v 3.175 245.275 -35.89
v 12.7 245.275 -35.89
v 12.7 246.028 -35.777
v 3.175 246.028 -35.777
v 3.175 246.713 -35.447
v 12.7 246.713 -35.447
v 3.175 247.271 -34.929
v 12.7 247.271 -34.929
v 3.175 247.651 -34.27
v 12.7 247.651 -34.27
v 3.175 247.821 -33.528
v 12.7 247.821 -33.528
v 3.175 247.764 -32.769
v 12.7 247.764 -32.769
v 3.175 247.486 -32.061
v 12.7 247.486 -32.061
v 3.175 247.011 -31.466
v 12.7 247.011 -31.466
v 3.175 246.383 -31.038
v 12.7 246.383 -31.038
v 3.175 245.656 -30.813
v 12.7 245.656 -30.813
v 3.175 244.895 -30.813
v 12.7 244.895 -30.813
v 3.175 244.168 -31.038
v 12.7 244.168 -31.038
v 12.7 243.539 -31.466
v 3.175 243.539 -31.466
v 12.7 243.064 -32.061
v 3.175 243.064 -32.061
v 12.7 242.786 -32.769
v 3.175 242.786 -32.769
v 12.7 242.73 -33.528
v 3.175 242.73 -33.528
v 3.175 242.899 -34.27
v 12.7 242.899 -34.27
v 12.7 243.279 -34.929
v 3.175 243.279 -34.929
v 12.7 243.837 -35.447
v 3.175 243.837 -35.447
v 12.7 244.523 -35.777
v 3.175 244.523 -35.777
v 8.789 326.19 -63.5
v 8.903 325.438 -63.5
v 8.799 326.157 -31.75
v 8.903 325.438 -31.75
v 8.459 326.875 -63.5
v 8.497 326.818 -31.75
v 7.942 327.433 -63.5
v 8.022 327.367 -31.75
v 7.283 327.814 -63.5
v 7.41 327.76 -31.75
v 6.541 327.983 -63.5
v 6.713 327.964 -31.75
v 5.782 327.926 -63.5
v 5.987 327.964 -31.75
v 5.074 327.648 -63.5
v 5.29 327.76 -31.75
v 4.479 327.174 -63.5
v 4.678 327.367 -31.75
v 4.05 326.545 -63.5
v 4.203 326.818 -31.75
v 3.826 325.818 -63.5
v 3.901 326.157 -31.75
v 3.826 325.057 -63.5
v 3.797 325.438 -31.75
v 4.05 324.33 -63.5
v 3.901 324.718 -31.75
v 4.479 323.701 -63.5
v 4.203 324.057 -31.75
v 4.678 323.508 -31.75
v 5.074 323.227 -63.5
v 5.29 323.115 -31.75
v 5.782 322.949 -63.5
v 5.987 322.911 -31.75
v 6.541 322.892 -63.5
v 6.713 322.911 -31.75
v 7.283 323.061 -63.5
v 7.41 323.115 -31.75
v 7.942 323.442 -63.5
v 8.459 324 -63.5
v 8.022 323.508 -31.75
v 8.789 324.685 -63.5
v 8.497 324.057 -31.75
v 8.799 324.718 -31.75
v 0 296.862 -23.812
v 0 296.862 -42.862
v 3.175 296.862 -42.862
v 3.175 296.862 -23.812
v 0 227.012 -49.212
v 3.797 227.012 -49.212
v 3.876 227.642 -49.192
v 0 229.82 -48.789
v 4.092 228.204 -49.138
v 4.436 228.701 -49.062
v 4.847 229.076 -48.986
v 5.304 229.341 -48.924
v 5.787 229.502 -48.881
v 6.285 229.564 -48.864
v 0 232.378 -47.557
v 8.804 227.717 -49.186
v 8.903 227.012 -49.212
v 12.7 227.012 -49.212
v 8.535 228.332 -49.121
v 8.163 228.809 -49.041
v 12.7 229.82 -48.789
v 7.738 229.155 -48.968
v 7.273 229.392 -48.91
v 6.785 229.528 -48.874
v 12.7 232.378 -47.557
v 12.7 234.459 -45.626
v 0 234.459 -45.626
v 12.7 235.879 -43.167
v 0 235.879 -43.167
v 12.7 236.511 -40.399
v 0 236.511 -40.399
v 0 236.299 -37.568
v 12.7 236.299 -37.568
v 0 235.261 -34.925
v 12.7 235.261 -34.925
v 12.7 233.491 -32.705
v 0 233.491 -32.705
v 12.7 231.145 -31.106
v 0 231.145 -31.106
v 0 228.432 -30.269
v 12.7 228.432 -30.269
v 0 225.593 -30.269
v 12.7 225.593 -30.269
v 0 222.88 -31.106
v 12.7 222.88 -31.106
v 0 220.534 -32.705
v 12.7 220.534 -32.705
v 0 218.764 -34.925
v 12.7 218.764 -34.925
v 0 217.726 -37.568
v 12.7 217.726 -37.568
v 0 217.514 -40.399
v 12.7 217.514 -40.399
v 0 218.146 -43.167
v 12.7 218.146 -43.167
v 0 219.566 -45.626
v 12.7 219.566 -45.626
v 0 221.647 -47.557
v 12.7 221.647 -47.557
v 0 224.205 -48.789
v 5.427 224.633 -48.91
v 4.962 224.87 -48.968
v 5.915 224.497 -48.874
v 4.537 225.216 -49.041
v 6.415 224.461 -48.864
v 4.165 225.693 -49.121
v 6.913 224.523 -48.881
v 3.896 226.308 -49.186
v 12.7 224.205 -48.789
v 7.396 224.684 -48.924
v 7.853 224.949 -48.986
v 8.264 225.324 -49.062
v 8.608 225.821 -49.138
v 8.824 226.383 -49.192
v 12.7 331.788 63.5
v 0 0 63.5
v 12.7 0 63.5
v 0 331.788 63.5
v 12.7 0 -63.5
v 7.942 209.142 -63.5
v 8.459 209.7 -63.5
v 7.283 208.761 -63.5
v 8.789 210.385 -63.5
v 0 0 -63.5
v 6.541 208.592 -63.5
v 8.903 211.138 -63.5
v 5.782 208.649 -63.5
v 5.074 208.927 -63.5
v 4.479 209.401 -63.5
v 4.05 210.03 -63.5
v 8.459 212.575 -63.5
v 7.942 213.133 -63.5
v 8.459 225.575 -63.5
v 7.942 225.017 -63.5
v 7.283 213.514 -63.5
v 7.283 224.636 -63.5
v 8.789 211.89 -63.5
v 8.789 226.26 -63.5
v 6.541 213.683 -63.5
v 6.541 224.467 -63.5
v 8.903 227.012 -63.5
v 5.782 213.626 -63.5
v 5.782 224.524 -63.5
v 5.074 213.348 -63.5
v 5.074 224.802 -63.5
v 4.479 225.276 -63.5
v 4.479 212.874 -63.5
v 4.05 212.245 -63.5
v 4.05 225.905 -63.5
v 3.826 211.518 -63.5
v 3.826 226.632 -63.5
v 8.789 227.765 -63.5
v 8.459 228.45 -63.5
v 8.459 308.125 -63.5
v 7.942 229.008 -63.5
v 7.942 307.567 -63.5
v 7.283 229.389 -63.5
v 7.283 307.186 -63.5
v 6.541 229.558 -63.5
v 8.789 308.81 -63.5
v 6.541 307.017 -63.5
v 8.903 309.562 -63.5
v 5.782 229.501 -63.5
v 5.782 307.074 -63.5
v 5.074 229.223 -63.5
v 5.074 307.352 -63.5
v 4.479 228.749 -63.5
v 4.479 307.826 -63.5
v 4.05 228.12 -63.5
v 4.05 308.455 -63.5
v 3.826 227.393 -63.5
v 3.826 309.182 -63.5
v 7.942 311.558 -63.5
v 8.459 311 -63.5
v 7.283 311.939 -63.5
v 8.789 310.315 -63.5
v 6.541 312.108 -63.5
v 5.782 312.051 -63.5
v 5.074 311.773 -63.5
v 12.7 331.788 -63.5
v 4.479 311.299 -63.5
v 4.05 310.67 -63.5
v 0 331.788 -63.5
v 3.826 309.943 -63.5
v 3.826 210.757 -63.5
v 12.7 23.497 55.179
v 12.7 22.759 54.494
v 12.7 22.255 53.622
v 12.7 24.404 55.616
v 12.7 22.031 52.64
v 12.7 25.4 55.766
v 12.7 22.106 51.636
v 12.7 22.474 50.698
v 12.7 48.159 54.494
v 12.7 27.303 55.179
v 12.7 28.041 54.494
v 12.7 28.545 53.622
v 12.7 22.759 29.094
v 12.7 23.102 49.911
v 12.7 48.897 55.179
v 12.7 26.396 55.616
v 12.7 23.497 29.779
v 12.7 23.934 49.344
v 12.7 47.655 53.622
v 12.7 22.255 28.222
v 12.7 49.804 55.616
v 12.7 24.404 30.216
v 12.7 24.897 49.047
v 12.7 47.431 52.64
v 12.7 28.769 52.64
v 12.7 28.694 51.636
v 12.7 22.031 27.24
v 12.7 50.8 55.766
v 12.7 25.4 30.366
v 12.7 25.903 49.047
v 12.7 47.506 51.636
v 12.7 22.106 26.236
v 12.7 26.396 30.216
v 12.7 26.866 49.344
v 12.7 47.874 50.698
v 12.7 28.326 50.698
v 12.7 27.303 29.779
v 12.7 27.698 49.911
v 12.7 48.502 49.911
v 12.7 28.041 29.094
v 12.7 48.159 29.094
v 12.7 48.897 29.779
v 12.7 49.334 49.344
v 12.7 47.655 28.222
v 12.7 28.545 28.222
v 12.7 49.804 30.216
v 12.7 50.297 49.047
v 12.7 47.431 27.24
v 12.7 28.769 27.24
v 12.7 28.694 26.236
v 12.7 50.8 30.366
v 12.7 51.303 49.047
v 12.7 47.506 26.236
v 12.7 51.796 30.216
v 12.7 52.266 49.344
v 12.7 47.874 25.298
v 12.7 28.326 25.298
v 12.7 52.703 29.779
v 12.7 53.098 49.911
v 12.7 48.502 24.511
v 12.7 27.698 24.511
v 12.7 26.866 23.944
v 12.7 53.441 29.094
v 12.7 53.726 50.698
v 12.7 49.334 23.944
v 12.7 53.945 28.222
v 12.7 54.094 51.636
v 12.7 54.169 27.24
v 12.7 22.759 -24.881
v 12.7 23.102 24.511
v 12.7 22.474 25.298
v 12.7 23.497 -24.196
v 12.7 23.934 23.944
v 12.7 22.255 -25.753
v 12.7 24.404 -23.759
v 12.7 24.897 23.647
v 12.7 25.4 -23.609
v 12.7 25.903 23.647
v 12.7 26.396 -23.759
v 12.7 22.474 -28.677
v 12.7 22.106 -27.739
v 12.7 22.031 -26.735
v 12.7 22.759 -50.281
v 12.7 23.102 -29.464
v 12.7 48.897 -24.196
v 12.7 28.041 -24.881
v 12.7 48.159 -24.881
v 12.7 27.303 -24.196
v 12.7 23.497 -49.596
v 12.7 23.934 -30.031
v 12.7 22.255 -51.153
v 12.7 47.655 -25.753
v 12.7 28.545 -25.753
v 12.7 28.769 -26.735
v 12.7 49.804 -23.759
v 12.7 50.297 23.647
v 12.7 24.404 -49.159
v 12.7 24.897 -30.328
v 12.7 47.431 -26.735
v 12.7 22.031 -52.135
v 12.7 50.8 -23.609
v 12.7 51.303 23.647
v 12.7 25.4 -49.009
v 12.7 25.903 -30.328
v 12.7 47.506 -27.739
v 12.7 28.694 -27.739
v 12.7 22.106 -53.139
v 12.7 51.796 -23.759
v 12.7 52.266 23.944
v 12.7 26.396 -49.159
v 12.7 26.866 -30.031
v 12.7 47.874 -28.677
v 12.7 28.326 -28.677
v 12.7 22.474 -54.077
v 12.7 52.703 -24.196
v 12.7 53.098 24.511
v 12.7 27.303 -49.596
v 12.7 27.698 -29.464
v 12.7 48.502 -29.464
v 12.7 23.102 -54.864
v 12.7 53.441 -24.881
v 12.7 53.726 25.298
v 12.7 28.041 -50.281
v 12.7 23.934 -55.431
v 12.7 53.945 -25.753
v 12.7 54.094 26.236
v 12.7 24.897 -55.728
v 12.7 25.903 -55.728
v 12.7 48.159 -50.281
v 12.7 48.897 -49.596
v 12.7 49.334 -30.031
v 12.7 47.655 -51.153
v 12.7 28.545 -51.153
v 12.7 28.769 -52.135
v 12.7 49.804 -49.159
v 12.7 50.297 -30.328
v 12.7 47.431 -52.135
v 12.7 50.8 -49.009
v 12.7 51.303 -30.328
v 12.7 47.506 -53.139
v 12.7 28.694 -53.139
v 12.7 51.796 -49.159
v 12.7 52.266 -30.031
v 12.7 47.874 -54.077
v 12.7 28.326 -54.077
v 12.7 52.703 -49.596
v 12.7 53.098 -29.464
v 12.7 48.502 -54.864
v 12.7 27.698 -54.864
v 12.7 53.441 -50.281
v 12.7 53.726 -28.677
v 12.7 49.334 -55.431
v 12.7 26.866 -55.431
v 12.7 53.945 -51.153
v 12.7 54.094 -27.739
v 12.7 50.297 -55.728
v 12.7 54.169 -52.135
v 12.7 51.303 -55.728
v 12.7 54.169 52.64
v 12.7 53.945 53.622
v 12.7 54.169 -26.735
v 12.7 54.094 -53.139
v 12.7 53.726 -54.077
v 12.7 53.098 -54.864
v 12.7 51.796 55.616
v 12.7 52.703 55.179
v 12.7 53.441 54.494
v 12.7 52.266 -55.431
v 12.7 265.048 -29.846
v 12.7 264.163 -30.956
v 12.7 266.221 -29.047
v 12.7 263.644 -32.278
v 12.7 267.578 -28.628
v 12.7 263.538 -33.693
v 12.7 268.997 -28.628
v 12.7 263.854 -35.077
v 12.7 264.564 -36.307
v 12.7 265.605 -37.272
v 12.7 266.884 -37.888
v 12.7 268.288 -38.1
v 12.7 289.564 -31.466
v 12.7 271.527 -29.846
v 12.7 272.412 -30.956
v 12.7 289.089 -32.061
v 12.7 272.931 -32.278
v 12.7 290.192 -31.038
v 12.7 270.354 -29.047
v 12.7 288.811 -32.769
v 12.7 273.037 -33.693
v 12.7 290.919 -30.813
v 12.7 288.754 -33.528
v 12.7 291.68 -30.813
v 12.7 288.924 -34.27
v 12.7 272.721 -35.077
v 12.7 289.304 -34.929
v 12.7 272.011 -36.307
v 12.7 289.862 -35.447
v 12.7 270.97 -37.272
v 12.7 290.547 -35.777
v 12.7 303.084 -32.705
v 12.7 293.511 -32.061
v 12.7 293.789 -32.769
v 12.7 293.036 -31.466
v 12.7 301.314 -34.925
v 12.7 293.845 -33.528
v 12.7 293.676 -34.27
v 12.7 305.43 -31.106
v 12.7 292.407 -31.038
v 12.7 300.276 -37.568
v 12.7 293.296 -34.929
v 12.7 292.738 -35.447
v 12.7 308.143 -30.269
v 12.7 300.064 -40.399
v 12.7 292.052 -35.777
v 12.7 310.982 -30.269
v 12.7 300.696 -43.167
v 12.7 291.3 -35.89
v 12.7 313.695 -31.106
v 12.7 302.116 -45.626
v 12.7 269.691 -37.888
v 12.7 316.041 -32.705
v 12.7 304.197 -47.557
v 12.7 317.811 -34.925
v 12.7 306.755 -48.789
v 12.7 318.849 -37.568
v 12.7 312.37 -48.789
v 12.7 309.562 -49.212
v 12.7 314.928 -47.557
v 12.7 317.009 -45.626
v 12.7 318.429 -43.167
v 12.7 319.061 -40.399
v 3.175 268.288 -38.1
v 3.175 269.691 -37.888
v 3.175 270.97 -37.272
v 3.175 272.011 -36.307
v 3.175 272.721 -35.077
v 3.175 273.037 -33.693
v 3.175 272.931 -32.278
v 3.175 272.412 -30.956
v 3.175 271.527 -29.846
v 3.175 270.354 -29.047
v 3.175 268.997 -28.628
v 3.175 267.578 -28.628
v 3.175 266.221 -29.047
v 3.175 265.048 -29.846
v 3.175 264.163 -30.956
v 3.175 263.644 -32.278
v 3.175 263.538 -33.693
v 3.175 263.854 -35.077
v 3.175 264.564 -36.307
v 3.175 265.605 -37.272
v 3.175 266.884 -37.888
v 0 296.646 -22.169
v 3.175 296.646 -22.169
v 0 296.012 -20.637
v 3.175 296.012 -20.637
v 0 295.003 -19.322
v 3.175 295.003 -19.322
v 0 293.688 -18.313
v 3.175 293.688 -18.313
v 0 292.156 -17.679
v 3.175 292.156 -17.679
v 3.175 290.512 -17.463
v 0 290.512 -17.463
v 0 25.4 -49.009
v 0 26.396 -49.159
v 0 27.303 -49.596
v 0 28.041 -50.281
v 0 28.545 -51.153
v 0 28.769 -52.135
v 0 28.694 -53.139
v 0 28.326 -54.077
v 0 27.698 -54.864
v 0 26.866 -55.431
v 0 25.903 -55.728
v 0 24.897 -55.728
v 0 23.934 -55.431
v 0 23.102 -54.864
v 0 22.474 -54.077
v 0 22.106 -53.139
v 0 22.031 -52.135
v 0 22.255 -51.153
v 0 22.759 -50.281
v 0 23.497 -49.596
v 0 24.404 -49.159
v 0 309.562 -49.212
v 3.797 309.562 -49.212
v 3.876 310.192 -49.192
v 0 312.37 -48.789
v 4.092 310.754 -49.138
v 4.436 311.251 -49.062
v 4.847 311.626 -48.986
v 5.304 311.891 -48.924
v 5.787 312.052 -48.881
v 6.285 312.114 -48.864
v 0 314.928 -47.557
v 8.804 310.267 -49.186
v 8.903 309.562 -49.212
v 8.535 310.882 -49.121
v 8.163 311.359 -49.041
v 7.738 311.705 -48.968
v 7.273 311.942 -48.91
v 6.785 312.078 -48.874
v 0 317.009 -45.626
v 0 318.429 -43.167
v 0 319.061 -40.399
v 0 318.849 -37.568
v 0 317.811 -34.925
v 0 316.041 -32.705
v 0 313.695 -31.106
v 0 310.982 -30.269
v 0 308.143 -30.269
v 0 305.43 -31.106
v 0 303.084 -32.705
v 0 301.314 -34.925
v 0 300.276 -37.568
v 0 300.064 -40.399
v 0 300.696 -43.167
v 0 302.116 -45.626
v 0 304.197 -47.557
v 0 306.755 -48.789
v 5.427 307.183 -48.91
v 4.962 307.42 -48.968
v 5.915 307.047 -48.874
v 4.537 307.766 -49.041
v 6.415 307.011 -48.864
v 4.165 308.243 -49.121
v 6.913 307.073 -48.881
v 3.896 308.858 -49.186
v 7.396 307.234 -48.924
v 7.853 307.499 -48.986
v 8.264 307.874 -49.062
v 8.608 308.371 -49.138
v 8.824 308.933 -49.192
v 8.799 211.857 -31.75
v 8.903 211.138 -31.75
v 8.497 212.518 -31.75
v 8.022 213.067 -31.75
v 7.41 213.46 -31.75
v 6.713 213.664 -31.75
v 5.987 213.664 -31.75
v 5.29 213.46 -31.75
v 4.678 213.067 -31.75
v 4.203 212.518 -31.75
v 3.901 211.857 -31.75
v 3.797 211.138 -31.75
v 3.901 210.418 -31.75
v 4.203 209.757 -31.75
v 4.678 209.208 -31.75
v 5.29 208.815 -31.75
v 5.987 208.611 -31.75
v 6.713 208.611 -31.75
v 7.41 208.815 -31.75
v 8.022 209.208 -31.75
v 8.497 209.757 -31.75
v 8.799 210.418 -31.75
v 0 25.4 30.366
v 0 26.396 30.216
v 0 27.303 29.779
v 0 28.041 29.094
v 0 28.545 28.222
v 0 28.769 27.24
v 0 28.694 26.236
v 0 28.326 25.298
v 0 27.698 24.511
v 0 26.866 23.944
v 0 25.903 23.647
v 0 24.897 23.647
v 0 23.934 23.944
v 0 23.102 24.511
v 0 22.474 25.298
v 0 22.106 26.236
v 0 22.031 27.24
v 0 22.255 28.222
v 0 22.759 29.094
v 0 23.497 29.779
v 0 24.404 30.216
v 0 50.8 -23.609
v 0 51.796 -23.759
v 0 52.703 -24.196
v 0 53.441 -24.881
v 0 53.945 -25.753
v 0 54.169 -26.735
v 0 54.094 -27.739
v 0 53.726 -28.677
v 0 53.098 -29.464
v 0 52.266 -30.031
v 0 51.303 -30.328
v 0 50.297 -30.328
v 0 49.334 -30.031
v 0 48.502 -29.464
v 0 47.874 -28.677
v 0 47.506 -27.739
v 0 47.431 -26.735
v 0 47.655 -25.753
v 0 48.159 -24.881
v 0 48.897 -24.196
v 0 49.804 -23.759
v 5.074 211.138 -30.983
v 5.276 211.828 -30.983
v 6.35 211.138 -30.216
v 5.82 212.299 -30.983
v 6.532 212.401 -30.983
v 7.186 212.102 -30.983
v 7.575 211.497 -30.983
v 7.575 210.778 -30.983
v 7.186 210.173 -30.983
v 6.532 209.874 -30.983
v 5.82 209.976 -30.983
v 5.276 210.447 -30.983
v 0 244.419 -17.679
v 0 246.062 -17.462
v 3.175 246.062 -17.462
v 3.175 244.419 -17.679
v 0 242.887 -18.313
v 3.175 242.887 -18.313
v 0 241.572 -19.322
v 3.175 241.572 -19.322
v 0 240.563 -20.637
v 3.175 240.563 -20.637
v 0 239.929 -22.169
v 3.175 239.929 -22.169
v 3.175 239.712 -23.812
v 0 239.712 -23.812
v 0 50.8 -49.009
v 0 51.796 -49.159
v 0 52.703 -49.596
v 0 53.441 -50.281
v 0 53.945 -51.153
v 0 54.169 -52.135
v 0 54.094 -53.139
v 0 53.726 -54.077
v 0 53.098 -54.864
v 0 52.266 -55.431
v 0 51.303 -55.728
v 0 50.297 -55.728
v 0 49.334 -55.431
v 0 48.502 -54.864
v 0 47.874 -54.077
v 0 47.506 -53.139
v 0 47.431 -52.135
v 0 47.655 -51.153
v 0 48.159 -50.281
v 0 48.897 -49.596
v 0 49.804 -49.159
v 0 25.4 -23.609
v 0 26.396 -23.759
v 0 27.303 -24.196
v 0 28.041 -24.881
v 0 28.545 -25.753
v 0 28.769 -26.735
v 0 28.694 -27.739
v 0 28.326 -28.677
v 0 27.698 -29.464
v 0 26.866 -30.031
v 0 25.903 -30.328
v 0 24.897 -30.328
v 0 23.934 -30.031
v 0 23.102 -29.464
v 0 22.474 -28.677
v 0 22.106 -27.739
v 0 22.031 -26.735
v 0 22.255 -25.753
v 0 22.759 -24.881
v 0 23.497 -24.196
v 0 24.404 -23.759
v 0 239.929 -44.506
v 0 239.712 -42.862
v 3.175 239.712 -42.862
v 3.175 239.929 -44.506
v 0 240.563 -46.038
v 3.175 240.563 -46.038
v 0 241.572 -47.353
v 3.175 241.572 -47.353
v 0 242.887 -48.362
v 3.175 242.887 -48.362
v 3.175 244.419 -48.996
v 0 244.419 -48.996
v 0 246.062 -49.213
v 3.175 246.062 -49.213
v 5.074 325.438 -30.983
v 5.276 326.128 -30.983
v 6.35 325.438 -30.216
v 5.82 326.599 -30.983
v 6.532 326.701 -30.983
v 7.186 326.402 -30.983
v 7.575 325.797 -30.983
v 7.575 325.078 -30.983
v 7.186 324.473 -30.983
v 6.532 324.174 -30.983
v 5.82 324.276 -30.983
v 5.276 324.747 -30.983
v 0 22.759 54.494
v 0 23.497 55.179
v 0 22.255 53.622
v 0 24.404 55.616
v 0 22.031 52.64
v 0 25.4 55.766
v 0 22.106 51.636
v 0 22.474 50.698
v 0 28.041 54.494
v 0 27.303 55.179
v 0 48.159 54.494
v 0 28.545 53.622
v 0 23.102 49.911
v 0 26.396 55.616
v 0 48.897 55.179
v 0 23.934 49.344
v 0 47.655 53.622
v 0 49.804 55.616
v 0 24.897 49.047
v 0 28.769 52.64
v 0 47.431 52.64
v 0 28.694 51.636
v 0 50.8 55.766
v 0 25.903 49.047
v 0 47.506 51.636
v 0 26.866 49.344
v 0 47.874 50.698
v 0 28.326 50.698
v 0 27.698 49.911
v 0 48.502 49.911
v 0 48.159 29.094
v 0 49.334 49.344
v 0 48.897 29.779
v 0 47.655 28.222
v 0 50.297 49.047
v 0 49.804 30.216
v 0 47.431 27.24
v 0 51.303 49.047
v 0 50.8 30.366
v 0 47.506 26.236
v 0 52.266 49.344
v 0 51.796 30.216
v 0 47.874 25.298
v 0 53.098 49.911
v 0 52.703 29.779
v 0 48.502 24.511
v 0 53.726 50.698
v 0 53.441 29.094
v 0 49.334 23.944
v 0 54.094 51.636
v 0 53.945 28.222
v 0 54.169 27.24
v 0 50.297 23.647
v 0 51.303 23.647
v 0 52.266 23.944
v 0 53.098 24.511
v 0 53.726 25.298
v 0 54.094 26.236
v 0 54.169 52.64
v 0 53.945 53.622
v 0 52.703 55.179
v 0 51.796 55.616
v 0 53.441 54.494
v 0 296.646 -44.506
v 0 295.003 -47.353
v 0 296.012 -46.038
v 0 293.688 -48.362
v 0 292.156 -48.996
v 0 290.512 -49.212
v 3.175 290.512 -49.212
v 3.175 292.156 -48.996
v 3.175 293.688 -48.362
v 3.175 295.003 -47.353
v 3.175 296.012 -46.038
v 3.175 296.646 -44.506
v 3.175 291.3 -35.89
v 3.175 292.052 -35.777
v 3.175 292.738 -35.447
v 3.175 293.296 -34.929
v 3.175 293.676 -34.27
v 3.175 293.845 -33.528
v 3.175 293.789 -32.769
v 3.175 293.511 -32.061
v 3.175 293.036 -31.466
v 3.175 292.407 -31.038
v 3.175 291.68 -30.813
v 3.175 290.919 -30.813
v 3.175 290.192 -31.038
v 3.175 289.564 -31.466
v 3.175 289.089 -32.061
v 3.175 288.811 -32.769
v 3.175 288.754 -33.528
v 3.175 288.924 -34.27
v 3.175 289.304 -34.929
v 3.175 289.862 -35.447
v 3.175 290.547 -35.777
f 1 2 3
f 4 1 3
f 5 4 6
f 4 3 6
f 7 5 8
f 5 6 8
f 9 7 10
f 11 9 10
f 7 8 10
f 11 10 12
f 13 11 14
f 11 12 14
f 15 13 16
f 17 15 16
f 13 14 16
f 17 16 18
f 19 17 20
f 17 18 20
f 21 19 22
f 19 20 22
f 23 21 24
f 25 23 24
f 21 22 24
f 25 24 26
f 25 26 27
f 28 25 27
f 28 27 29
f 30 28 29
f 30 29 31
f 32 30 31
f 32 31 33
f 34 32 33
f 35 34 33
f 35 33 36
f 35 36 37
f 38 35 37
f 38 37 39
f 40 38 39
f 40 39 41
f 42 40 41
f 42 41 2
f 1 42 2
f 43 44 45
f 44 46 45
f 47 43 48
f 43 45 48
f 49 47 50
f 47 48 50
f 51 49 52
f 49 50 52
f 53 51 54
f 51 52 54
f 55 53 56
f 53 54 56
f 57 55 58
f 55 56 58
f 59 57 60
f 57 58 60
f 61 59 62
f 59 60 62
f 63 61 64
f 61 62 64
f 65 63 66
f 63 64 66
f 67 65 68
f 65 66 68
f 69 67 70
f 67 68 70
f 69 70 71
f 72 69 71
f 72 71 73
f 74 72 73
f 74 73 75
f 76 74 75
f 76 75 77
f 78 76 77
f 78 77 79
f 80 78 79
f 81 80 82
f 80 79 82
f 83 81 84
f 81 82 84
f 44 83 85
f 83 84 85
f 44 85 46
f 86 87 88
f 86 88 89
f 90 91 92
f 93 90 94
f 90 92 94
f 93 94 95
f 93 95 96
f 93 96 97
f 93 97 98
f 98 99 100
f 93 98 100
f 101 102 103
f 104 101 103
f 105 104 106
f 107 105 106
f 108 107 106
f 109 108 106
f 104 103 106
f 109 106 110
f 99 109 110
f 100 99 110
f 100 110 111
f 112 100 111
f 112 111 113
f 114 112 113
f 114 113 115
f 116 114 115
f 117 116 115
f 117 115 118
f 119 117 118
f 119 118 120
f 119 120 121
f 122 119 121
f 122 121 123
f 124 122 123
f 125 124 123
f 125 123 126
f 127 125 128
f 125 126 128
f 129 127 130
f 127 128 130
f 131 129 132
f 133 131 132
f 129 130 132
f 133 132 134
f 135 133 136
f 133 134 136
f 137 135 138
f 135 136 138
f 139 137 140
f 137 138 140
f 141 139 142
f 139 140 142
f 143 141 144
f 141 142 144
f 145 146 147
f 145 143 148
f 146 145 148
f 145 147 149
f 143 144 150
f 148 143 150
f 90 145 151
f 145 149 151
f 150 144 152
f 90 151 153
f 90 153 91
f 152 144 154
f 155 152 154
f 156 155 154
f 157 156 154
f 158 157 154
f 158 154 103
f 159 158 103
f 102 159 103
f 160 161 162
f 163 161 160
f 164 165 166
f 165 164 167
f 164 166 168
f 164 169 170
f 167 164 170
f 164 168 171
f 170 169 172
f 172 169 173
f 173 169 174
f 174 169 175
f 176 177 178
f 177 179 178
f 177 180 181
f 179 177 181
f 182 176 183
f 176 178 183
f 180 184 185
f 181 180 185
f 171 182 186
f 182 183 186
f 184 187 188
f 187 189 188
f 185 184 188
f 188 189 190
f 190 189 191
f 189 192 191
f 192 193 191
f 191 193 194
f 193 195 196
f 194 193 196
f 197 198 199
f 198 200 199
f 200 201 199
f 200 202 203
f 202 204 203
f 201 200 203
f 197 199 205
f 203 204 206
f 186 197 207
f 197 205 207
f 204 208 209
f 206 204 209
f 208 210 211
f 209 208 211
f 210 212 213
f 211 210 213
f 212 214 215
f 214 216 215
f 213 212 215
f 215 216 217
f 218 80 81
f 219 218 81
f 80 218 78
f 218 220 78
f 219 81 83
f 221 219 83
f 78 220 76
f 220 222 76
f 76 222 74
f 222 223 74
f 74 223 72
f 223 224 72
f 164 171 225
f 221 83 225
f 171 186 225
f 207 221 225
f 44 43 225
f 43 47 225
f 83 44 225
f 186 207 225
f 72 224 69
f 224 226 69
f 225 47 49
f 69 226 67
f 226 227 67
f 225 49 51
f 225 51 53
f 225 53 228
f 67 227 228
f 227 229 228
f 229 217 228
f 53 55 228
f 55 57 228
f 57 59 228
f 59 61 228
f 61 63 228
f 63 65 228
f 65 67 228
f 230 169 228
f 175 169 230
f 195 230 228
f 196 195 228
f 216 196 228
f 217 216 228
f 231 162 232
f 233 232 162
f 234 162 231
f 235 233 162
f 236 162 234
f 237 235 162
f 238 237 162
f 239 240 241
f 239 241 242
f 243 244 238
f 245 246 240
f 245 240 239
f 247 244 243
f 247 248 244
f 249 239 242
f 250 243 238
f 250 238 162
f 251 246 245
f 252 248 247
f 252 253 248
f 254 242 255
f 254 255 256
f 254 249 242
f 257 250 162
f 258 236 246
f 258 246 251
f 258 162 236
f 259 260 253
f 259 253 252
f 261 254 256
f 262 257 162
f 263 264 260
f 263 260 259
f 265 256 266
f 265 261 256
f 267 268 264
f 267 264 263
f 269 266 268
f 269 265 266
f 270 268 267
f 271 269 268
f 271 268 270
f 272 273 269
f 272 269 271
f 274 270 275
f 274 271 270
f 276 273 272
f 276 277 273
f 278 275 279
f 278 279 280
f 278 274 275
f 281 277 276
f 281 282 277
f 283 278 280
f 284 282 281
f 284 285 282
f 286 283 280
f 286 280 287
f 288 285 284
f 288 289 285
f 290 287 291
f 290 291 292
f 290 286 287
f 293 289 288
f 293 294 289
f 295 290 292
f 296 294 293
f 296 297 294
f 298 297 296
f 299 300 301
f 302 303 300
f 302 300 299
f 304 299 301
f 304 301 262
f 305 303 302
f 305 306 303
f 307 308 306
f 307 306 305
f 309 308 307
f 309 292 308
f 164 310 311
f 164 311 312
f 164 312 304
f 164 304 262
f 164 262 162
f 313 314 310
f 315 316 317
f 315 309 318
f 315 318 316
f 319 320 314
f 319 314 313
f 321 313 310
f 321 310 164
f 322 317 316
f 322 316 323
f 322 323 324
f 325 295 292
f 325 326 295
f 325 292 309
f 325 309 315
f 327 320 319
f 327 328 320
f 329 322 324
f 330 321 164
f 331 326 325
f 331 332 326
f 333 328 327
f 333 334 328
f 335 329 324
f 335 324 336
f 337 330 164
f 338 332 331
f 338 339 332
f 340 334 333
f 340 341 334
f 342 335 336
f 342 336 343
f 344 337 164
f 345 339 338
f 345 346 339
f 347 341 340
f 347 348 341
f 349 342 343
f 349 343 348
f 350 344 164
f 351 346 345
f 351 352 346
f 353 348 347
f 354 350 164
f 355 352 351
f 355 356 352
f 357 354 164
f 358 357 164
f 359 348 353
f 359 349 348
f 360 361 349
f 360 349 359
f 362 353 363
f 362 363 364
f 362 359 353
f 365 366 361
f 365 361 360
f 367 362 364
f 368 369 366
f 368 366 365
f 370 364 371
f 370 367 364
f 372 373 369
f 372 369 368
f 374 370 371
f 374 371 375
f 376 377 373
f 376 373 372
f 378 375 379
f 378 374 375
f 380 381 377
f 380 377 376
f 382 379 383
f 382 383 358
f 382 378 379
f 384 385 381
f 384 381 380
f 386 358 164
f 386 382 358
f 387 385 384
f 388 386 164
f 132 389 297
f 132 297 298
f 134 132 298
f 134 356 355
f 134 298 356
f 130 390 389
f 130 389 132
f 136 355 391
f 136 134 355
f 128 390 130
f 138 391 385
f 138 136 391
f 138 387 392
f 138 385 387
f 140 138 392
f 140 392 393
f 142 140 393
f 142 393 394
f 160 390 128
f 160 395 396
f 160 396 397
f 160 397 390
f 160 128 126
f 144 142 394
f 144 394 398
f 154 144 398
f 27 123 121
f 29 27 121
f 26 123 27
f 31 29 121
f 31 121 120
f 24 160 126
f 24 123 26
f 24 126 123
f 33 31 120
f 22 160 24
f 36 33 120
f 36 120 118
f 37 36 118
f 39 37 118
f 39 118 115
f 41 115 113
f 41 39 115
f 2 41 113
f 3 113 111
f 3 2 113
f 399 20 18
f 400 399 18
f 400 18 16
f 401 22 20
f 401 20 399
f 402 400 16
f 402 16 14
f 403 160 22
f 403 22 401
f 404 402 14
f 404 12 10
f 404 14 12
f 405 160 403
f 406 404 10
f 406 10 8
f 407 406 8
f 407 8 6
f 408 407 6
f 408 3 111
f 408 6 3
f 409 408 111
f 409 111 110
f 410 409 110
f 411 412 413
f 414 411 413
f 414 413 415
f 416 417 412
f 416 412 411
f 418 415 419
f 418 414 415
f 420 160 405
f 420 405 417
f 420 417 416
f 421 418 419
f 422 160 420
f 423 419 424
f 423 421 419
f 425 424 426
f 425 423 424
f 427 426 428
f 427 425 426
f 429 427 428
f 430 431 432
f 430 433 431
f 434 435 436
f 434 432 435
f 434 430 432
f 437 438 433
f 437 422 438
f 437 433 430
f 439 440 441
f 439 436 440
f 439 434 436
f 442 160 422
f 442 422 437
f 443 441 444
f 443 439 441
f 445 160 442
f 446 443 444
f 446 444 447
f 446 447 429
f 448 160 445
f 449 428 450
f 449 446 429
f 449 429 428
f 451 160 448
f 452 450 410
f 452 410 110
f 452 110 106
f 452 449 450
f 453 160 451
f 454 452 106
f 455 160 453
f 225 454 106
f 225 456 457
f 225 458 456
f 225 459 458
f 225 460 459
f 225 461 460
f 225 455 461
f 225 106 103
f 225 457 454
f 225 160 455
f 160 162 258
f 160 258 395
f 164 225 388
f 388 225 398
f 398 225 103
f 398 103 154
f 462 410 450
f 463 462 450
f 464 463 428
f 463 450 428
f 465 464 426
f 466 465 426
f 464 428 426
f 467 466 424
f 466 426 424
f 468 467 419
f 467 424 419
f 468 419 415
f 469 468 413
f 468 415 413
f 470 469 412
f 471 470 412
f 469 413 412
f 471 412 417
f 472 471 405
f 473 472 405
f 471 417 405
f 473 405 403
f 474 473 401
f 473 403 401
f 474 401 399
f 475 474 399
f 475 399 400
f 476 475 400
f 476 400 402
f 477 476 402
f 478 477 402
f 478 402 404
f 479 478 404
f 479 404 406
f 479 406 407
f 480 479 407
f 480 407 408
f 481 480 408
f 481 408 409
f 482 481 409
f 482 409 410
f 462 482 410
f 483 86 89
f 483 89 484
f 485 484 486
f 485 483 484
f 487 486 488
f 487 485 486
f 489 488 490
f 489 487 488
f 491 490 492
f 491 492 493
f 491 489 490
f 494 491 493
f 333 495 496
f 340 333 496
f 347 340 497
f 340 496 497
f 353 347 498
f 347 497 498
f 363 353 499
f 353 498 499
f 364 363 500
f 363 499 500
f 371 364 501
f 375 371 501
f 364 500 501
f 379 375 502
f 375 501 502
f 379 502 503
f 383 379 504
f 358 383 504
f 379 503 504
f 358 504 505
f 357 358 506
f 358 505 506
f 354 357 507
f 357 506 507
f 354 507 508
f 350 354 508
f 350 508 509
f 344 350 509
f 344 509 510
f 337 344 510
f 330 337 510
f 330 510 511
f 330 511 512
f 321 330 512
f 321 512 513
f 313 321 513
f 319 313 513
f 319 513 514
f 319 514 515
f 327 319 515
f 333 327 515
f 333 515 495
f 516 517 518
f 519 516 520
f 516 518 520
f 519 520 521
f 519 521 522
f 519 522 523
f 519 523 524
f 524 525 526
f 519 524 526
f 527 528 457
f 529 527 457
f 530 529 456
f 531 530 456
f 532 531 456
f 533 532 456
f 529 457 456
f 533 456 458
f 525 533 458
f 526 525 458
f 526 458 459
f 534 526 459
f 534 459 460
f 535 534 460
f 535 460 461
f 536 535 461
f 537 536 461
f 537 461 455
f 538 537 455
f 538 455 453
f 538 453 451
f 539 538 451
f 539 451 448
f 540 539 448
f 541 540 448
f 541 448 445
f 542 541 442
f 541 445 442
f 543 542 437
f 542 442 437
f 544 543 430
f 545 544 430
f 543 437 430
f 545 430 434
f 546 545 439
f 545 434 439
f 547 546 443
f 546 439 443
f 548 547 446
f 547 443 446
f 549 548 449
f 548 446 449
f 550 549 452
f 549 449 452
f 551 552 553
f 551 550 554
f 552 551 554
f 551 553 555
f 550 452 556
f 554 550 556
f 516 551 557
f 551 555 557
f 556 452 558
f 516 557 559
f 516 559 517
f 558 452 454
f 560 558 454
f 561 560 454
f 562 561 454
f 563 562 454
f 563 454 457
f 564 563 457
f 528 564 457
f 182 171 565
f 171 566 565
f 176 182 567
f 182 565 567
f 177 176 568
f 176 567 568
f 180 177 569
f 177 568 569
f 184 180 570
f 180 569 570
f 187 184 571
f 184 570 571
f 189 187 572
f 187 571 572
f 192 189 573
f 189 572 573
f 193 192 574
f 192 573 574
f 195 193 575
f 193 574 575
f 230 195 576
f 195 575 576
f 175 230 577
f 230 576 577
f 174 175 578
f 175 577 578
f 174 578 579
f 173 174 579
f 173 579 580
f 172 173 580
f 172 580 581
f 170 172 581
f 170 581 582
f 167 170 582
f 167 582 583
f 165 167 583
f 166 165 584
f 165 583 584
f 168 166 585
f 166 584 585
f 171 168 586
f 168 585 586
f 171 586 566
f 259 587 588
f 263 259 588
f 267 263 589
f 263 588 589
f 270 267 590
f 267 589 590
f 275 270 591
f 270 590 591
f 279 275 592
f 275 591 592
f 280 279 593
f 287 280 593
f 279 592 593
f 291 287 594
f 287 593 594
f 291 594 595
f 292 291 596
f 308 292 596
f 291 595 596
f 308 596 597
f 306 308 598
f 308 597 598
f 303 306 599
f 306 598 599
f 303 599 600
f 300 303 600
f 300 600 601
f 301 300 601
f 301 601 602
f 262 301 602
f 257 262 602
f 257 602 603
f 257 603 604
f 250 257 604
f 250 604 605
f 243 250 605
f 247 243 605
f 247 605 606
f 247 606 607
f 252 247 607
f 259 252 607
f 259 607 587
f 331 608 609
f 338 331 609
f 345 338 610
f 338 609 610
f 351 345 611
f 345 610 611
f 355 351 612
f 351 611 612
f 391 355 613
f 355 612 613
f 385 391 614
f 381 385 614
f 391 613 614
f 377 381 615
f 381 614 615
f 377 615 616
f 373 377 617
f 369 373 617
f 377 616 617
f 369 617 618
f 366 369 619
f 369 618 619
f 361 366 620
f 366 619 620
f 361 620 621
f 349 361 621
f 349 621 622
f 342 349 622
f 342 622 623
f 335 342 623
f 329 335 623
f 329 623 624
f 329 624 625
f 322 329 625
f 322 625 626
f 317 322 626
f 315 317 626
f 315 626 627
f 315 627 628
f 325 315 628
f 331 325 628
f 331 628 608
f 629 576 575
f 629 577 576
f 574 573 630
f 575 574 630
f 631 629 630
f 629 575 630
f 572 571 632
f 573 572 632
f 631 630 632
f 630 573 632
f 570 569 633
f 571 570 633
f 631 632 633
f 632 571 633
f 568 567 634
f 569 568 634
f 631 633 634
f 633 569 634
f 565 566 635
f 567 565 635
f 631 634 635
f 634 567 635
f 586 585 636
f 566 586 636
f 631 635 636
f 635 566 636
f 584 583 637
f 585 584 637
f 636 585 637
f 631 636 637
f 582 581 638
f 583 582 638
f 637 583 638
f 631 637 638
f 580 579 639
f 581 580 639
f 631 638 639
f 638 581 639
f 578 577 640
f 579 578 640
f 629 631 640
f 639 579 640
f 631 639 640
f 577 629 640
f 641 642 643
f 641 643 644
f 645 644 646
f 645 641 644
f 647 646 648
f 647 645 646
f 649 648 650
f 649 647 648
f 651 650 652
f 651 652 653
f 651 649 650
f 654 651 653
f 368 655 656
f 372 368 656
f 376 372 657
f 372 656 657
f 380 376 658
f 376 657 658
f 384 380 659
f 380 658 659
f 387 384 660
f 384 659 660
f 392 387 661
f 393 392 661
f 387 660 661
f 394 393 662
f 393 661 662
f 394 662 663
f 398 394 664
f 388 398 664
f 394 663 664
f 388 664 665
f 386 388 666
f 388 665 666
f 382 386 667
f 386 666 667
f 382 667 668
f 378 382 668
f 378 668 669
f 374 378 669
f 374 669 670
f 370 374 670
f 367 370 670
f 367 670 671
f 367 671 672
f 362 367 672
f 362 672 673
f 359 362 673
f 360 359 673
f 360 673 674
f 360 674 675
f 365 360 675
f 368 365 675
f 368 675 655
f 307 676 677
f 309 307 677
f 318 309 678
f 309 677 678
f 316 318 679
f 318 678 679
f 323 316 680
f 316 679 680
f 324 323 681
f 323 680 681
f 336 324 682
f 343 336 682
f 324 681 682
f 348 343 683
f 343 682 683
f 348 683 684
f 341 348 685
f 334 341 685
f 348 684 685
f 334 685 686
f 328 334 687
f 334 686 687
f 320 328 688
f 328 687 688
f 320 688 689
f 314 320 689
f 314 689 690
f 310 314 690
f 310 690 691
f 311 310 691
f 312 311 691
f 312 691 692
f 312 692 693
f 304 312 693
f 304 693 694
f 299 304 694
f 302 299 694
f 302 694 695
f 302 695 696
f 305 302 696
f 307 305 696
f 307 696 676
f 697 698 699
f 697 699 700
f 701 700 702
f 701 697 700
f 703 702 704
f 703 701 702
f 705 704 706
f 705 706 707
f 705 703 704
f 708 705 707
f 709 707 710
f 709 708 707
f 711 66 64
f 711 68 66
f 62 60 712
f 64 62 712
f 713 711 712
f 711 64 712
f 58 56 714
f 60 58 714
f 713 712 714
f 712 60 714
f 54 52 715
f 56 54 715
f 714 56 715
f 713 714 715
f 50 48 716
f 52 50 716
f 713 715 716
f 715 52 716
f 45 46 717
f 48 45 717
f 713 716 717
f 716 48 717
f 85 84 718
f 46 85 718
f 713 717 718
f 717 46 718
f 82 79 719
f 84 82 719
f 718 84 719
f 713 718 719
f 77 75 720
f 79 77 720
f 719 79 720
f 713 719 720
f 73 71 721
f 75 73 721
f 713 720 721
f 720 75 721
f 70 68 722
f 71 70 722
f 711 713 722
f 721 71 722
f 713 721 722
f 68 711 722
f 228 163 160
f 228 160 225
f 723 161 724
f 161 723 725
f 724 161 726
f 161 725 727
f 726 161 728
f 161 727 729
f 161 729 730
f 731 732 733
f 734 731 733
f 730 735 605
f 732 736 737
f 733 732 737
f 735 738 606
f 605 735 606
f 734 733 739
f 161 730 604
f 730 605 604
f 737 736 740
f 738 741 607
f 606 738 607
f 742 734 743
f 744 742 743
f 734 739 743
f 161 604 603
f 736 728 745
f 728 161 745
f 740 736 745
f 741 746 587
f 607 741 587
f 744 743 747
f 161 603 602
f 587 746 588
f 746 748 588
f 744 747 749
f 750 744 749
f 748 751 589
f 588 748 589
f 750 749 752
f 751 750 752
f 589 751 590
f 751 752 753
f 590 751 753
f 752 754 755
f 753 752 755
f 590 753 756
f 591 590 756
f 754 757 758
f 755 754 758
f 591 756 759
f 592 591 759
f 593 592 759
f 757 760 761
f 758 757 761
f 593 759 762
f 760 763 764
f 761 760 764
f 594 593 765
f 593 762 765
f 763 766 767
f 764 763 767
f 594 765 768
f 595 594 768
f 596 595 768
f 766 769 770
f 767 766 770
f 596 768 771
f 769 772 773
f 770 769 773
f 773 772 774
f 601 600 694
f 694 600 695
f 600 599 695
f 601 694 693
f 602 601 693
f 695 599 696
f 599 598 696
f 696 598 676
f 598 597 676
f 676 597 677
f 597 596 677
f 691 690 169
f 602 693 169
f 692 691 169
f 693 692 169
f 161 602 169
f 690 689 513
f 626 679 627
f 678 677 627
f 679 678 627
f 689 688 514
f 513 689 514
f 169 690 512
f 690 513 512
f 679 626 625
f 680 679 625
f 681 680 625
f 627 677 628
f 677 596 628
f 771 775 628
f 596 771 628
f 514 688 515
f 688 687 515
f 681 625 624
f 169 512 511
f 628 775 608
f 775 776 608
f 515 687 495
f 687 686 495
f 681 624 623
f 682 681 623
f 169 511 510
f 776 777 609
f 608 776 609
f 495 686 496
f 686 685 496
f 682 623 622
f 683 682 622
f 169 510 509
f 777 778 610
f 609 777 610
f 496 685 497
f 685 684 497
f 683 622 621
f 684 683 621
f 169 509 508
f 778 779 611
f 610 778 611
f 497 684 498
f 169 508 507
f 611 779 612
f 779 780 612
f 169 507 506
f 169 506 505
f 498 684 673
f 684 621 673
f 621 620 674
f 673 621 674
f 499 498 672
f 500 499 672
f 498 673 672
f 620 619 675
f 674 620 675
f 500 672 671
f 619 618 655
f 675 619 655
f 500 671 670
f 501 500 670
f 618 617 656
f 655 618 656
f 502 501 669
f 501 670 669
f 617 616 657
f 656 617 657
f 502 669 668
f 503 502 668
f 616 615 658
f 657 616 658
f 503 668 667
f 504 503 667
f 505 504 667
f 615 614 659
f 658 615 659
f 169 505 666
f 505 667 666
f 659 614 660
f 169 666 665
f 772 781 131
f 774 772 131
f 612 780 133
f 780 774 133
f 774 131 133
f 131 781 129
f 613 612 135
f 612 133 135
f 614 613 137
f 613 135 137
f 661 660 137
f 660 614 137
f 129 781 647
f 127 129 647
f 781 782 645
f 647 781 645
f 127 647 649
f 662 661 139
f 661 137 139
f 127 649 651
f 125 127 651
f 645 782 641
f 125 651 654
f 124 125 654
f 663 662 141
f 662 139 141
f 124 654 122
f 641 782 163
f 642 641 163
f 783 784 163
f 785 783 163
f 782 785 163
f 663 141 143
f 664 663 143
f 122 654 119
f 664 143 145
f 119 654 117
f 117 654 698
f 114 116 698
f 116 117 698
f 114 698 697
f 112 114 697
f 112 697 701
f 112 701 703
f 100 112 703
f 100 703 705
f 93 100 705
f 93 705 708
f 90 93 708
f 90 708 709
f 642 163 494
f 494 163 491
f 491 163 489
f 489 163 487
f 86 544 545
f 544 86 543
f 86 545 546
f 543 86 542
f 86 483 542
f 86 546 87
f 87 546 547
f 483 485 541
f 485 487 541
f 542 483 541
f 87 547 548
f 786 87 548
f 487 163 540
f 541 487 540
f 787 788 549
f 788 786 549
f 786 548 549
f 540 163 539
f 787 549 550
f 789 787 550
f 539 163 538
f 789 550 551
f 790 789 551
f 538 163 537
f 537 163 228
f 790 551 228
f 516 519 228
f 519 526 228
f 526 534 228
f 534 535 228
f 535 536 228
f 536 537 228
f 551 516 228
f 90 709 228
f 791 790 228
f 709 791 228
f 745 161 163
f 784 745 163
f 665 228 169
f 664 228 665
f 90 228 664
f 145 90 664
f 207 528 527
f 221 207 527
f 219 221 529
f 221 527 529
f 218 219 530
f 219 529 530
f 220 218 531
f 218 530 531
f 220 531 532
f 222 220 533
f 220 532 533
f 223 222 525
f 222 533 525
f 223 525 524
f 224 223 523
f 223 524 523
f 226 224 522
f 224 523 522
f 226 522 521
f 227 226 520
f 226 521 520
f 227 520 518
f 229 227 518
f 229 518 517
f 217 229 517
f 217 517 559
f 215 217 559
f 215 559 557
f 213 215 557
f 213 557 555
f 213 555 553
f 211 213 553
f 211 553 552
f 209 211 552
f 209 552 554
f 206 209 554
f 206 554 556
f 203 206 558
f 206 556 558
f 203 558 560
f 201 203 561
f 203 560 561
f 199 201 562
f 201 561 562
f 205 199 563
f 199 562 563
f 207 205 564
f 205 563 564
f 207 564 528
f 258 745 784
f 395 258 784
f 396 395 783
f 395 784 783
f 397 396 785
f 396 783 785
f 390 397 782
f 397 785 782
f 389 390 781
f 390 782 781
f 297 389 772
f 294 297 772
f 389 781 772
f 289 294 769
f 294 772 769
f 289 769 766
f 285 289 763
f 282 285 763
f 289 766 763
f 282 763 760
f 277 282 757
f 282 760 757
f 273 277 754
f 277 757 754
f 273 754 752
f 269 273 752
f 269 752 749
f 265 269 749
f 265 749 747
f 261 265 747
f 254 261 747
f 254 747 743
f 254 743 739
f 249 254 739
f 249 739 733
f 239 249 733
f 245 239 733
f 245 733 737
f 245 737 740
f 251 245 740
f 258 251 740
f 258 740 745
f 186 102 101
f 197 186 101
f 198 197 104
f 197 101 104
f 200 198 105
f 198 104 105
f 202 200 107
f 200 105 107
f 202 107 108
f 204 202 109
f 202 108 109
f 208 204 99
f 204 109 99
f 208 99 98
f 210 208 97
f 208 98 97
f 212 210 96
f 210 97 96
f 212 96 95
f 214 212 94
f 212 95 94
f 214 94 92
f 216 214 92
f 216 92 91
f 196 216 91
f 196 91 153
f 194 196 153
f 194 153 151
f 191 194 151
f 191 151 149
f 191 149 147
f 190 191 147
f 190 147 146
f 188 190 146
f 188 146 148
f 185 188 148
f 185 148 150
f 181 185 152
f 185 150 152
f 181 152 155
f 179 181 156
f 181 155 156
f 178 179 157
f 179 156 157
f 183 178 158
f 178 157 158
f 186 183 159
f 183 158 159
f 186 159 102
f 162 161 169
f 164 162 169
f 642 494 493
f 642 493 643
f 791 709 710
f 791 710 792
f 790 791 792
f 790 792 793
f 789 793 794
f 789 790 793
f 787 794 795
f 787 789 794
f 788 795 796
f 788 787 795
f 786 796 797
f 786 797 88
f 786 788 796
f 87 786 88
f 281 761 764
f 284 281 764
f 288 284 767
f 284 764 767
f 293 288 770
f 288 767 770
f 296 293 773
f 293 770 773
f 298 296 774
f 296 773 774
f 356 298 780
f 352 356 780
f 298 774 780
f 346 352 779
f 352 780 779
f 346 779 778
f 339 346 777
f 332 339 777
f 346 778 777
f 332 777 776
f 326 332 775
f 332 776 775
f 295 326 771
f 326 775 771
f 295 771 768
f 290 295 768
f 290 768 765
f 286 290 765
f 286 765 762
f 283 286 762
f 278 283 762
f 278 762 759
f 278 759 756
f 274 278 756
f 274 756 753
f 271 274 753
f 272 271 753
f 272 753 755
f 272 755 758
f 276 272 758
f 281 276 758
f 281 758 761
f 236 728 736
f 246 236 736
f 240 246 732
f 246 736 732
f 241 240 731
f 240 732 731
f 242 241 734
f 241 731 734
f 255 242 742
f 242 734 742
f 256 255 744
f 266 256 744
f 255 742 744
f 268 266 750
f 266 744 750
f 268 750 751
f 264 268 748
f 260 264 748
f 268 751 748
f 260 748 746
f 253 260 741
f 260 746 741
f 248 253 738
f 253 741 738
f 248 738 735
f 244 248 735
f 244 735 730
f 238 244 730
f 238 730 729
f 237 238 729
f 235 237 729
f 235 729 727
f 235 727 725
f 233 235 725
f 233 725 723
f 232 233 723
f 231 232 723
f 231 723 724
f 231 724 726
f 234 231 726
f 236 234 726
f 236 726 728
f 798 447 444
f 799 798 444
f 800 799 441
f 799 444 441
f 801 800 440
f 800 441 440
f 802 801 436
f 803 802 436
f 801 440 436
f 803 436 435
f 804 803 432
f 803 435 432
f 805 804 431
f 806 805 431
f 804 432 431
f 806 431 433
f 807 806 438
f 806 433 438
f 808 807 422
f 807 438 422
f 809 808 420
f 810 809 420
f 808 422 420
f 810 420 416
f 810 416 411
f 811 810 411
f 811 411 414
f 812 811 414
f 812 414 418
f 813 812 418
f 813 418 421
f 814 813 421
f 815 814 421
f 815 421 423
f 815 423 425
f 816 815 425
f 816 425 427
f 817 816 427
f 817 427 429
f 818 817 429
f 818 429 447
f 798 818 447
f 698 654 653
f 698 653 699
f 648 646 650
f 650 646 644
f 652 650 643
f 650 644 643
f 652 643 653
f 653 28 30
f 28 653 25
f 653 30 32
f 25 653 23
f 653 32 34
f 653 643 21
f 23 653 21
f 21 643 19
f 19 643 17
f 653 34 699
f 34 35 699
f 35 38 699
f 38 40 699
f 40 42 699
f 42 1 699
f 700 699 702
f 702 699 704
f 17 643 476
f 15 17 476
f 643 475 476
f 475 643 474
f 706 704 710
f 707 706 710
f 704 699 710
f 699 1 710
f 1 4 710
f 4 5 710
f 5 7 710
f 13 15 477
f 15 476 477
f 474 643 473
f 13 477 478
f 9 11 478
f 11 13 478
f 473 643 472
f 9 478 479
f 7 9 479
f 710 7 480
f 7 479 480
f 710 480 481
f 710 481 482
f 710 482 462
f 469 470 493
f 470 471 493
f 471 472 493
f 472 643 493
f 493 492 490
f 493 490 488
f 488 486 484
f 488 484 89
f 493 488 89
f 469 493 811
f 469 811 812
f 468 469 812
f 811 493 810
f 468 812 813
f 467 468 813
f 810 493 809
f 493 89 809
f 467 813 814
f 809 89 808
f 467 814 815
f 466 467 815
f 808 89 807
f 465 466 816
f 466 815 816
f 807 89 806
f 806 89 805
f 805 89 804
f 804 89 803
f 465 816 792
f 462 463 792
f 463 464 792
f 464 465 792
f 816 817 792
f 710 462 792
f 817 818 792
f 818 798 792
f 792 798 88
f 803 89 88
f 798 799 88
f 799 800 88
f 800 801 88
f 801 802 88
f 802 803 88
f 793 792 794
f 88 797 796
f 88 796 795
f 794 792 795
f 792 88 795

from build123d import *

# Parameters (mm, degrees)
SKETCH1_W                             = 127
SKETCH1_H                             = 331.7875
BOSS_EXTRUDE1_DEPTH                   = 12.7
SKETCH9_R                             = 9.525
SKETCH9_R_2                           = 4.7625
CUT_EXTRUDE1_DEPTH                    = 339.048051549
CUT_EXTRUDE3_DEPTH                    = 3.175
F_10_CLEARANCE_HOLE2_D                = 5.1054
TAPPED_HOLE_FOR_10_32_HELICOIL1_D     = 5.1054
TAPPED_HOLE_FOR_10_32_HELICOIL1_DEPTH = 31.75
TAPPED_HOLE_FOR_10_32_HELICOIL1_TIP   = 1.533816902
F_1_4_CLEARANCE_HOLE1_D               = 6.7564


with BuildPart() as part:
    # Sketch1 → Boss-Extrude1 (new body)
    with BuildSketch(Plane(origin=(0, 0, 0), x_dir=(0, 0, -1), z_dir=(1, 0, 0))):
        with Locations((0, 165.89375)):
            Rectangle(SKETCH1_W, SKETCH1_H)
    extrude(amount=BOSS_EXTRUDE1_DEPTH)

    # Sketch9 → Cut-Extrude1 (cut, through all)
    with BuildSketch(Plane(origin=(12.7, 0, 0), x_dir=(0, 0, -1), z_dir=(1, 0, 0))):
        with Locations((39.6875, 309.5625)):
            Circle(SKETCH9_R)
        with Locations((39.6875, 227.0125)):
            Circle(SKETCH9_R)
        with Locations((33.3375, 268.2875)):
            Circle(SKETCH9_R_2)
    extrude(amount=-CUT_EXTRUDE1_DEPTH, mode=Mode.SUBTRACT)

    # Sketch24 → Cut-Extrude3 (cut)
    with BuildSketch(Plane.ZY):
        with BuildLine():
            Line((-42.8625, 296.8625), (-23.8125, 296.8625))
            ThreePointArc((-23.8125, 296.8625), (-19.322371939, 295.002628061), (-17.4625, 290.5125))
            Line((-17.4625, 290.5125), (-17.4625, 246.0625))
            ThreePointArc((-17.4625, 246.0625), (-19.322371939, 241.572371939), (-23.8125, 239.7125))
            Line((-23.8125, 239.7125), (-42.8625, 239.7125))
            ThreePointArc((-42.8625, 239.7125), (-47.352628061, 241.572371939), (-49.2125, 246.0625))
            Line((-49.2125, 246.0625), (-49.2125, 290.5125))
            ThreePointArc((-49.2125, 290.5125), (-47.352628061, 295.002628061), (-42.8625, 296.8625))
        make_face()
    extrude(amount=-CUT_EXTRUDE3_DEPTH, mode=Mode.SUBTRACT)

    # #10 Clearance Hole2 (through all)
    with Locations(Plane.ZY.offset(-3.175)):
        with Locations((-33.3375, 291.2999), (-33.3375, 245.2751)):
            Hole(F_10_CLEARANCE_HOLE2_D / 2)

    # Tapped Hole for #10-32 Helicoil1
    with Locations(Plane(origin=(0, 0, -63.5), x_dir=(-1, 0, 0), z_dir=(0, 0, -1))):
        with Locations((-6.35, 325.4375), (-6.35, 211.1375), (-6.35, 309.5625), (-6.35, 227.0125)):
            Hole(TAPPED_HOLE_FOR_10_32_HELICOIL1_D / 2, depth=TAPPED_HOLE_FOR_10_32_HELICOIL1_DEPTH)
            with Locations((0, 0, -(TAPPED_HOLE_FOR_10_32_HELICOIL1_DEPTH + TAPPED_HOLE_FOR_10_32_HELICOIL1_TIP / 2))):  # 118° drill point
                Cone(0, TAPPED_HOLE_FOR_10_32_HELICOIL1_D / 2, TAPPED_HOLE_FOR_10_32_HELICOIL1_TIP, mode=Mode.SUBTRACT)

    # 1/4 Clearance Hole1 (through all)
    with Locations(Plane(origin=(12.7, 0, 0), x_dir=(0, 0, -1), z_dir=(1, 0, 0))):
        with Locations((-52.3875, 25.4), (-26.9875, 50.8), (-52.3875, 50.8), (-26.9875, 25.4), (26.9875, 50.8), (52.3875, 25.4), (26.9875, 25.4), (52.3875, 50.8)):
            Hole(F_1_4_CLEARANCE_HOLE1_D / 2)


solid = part.part
